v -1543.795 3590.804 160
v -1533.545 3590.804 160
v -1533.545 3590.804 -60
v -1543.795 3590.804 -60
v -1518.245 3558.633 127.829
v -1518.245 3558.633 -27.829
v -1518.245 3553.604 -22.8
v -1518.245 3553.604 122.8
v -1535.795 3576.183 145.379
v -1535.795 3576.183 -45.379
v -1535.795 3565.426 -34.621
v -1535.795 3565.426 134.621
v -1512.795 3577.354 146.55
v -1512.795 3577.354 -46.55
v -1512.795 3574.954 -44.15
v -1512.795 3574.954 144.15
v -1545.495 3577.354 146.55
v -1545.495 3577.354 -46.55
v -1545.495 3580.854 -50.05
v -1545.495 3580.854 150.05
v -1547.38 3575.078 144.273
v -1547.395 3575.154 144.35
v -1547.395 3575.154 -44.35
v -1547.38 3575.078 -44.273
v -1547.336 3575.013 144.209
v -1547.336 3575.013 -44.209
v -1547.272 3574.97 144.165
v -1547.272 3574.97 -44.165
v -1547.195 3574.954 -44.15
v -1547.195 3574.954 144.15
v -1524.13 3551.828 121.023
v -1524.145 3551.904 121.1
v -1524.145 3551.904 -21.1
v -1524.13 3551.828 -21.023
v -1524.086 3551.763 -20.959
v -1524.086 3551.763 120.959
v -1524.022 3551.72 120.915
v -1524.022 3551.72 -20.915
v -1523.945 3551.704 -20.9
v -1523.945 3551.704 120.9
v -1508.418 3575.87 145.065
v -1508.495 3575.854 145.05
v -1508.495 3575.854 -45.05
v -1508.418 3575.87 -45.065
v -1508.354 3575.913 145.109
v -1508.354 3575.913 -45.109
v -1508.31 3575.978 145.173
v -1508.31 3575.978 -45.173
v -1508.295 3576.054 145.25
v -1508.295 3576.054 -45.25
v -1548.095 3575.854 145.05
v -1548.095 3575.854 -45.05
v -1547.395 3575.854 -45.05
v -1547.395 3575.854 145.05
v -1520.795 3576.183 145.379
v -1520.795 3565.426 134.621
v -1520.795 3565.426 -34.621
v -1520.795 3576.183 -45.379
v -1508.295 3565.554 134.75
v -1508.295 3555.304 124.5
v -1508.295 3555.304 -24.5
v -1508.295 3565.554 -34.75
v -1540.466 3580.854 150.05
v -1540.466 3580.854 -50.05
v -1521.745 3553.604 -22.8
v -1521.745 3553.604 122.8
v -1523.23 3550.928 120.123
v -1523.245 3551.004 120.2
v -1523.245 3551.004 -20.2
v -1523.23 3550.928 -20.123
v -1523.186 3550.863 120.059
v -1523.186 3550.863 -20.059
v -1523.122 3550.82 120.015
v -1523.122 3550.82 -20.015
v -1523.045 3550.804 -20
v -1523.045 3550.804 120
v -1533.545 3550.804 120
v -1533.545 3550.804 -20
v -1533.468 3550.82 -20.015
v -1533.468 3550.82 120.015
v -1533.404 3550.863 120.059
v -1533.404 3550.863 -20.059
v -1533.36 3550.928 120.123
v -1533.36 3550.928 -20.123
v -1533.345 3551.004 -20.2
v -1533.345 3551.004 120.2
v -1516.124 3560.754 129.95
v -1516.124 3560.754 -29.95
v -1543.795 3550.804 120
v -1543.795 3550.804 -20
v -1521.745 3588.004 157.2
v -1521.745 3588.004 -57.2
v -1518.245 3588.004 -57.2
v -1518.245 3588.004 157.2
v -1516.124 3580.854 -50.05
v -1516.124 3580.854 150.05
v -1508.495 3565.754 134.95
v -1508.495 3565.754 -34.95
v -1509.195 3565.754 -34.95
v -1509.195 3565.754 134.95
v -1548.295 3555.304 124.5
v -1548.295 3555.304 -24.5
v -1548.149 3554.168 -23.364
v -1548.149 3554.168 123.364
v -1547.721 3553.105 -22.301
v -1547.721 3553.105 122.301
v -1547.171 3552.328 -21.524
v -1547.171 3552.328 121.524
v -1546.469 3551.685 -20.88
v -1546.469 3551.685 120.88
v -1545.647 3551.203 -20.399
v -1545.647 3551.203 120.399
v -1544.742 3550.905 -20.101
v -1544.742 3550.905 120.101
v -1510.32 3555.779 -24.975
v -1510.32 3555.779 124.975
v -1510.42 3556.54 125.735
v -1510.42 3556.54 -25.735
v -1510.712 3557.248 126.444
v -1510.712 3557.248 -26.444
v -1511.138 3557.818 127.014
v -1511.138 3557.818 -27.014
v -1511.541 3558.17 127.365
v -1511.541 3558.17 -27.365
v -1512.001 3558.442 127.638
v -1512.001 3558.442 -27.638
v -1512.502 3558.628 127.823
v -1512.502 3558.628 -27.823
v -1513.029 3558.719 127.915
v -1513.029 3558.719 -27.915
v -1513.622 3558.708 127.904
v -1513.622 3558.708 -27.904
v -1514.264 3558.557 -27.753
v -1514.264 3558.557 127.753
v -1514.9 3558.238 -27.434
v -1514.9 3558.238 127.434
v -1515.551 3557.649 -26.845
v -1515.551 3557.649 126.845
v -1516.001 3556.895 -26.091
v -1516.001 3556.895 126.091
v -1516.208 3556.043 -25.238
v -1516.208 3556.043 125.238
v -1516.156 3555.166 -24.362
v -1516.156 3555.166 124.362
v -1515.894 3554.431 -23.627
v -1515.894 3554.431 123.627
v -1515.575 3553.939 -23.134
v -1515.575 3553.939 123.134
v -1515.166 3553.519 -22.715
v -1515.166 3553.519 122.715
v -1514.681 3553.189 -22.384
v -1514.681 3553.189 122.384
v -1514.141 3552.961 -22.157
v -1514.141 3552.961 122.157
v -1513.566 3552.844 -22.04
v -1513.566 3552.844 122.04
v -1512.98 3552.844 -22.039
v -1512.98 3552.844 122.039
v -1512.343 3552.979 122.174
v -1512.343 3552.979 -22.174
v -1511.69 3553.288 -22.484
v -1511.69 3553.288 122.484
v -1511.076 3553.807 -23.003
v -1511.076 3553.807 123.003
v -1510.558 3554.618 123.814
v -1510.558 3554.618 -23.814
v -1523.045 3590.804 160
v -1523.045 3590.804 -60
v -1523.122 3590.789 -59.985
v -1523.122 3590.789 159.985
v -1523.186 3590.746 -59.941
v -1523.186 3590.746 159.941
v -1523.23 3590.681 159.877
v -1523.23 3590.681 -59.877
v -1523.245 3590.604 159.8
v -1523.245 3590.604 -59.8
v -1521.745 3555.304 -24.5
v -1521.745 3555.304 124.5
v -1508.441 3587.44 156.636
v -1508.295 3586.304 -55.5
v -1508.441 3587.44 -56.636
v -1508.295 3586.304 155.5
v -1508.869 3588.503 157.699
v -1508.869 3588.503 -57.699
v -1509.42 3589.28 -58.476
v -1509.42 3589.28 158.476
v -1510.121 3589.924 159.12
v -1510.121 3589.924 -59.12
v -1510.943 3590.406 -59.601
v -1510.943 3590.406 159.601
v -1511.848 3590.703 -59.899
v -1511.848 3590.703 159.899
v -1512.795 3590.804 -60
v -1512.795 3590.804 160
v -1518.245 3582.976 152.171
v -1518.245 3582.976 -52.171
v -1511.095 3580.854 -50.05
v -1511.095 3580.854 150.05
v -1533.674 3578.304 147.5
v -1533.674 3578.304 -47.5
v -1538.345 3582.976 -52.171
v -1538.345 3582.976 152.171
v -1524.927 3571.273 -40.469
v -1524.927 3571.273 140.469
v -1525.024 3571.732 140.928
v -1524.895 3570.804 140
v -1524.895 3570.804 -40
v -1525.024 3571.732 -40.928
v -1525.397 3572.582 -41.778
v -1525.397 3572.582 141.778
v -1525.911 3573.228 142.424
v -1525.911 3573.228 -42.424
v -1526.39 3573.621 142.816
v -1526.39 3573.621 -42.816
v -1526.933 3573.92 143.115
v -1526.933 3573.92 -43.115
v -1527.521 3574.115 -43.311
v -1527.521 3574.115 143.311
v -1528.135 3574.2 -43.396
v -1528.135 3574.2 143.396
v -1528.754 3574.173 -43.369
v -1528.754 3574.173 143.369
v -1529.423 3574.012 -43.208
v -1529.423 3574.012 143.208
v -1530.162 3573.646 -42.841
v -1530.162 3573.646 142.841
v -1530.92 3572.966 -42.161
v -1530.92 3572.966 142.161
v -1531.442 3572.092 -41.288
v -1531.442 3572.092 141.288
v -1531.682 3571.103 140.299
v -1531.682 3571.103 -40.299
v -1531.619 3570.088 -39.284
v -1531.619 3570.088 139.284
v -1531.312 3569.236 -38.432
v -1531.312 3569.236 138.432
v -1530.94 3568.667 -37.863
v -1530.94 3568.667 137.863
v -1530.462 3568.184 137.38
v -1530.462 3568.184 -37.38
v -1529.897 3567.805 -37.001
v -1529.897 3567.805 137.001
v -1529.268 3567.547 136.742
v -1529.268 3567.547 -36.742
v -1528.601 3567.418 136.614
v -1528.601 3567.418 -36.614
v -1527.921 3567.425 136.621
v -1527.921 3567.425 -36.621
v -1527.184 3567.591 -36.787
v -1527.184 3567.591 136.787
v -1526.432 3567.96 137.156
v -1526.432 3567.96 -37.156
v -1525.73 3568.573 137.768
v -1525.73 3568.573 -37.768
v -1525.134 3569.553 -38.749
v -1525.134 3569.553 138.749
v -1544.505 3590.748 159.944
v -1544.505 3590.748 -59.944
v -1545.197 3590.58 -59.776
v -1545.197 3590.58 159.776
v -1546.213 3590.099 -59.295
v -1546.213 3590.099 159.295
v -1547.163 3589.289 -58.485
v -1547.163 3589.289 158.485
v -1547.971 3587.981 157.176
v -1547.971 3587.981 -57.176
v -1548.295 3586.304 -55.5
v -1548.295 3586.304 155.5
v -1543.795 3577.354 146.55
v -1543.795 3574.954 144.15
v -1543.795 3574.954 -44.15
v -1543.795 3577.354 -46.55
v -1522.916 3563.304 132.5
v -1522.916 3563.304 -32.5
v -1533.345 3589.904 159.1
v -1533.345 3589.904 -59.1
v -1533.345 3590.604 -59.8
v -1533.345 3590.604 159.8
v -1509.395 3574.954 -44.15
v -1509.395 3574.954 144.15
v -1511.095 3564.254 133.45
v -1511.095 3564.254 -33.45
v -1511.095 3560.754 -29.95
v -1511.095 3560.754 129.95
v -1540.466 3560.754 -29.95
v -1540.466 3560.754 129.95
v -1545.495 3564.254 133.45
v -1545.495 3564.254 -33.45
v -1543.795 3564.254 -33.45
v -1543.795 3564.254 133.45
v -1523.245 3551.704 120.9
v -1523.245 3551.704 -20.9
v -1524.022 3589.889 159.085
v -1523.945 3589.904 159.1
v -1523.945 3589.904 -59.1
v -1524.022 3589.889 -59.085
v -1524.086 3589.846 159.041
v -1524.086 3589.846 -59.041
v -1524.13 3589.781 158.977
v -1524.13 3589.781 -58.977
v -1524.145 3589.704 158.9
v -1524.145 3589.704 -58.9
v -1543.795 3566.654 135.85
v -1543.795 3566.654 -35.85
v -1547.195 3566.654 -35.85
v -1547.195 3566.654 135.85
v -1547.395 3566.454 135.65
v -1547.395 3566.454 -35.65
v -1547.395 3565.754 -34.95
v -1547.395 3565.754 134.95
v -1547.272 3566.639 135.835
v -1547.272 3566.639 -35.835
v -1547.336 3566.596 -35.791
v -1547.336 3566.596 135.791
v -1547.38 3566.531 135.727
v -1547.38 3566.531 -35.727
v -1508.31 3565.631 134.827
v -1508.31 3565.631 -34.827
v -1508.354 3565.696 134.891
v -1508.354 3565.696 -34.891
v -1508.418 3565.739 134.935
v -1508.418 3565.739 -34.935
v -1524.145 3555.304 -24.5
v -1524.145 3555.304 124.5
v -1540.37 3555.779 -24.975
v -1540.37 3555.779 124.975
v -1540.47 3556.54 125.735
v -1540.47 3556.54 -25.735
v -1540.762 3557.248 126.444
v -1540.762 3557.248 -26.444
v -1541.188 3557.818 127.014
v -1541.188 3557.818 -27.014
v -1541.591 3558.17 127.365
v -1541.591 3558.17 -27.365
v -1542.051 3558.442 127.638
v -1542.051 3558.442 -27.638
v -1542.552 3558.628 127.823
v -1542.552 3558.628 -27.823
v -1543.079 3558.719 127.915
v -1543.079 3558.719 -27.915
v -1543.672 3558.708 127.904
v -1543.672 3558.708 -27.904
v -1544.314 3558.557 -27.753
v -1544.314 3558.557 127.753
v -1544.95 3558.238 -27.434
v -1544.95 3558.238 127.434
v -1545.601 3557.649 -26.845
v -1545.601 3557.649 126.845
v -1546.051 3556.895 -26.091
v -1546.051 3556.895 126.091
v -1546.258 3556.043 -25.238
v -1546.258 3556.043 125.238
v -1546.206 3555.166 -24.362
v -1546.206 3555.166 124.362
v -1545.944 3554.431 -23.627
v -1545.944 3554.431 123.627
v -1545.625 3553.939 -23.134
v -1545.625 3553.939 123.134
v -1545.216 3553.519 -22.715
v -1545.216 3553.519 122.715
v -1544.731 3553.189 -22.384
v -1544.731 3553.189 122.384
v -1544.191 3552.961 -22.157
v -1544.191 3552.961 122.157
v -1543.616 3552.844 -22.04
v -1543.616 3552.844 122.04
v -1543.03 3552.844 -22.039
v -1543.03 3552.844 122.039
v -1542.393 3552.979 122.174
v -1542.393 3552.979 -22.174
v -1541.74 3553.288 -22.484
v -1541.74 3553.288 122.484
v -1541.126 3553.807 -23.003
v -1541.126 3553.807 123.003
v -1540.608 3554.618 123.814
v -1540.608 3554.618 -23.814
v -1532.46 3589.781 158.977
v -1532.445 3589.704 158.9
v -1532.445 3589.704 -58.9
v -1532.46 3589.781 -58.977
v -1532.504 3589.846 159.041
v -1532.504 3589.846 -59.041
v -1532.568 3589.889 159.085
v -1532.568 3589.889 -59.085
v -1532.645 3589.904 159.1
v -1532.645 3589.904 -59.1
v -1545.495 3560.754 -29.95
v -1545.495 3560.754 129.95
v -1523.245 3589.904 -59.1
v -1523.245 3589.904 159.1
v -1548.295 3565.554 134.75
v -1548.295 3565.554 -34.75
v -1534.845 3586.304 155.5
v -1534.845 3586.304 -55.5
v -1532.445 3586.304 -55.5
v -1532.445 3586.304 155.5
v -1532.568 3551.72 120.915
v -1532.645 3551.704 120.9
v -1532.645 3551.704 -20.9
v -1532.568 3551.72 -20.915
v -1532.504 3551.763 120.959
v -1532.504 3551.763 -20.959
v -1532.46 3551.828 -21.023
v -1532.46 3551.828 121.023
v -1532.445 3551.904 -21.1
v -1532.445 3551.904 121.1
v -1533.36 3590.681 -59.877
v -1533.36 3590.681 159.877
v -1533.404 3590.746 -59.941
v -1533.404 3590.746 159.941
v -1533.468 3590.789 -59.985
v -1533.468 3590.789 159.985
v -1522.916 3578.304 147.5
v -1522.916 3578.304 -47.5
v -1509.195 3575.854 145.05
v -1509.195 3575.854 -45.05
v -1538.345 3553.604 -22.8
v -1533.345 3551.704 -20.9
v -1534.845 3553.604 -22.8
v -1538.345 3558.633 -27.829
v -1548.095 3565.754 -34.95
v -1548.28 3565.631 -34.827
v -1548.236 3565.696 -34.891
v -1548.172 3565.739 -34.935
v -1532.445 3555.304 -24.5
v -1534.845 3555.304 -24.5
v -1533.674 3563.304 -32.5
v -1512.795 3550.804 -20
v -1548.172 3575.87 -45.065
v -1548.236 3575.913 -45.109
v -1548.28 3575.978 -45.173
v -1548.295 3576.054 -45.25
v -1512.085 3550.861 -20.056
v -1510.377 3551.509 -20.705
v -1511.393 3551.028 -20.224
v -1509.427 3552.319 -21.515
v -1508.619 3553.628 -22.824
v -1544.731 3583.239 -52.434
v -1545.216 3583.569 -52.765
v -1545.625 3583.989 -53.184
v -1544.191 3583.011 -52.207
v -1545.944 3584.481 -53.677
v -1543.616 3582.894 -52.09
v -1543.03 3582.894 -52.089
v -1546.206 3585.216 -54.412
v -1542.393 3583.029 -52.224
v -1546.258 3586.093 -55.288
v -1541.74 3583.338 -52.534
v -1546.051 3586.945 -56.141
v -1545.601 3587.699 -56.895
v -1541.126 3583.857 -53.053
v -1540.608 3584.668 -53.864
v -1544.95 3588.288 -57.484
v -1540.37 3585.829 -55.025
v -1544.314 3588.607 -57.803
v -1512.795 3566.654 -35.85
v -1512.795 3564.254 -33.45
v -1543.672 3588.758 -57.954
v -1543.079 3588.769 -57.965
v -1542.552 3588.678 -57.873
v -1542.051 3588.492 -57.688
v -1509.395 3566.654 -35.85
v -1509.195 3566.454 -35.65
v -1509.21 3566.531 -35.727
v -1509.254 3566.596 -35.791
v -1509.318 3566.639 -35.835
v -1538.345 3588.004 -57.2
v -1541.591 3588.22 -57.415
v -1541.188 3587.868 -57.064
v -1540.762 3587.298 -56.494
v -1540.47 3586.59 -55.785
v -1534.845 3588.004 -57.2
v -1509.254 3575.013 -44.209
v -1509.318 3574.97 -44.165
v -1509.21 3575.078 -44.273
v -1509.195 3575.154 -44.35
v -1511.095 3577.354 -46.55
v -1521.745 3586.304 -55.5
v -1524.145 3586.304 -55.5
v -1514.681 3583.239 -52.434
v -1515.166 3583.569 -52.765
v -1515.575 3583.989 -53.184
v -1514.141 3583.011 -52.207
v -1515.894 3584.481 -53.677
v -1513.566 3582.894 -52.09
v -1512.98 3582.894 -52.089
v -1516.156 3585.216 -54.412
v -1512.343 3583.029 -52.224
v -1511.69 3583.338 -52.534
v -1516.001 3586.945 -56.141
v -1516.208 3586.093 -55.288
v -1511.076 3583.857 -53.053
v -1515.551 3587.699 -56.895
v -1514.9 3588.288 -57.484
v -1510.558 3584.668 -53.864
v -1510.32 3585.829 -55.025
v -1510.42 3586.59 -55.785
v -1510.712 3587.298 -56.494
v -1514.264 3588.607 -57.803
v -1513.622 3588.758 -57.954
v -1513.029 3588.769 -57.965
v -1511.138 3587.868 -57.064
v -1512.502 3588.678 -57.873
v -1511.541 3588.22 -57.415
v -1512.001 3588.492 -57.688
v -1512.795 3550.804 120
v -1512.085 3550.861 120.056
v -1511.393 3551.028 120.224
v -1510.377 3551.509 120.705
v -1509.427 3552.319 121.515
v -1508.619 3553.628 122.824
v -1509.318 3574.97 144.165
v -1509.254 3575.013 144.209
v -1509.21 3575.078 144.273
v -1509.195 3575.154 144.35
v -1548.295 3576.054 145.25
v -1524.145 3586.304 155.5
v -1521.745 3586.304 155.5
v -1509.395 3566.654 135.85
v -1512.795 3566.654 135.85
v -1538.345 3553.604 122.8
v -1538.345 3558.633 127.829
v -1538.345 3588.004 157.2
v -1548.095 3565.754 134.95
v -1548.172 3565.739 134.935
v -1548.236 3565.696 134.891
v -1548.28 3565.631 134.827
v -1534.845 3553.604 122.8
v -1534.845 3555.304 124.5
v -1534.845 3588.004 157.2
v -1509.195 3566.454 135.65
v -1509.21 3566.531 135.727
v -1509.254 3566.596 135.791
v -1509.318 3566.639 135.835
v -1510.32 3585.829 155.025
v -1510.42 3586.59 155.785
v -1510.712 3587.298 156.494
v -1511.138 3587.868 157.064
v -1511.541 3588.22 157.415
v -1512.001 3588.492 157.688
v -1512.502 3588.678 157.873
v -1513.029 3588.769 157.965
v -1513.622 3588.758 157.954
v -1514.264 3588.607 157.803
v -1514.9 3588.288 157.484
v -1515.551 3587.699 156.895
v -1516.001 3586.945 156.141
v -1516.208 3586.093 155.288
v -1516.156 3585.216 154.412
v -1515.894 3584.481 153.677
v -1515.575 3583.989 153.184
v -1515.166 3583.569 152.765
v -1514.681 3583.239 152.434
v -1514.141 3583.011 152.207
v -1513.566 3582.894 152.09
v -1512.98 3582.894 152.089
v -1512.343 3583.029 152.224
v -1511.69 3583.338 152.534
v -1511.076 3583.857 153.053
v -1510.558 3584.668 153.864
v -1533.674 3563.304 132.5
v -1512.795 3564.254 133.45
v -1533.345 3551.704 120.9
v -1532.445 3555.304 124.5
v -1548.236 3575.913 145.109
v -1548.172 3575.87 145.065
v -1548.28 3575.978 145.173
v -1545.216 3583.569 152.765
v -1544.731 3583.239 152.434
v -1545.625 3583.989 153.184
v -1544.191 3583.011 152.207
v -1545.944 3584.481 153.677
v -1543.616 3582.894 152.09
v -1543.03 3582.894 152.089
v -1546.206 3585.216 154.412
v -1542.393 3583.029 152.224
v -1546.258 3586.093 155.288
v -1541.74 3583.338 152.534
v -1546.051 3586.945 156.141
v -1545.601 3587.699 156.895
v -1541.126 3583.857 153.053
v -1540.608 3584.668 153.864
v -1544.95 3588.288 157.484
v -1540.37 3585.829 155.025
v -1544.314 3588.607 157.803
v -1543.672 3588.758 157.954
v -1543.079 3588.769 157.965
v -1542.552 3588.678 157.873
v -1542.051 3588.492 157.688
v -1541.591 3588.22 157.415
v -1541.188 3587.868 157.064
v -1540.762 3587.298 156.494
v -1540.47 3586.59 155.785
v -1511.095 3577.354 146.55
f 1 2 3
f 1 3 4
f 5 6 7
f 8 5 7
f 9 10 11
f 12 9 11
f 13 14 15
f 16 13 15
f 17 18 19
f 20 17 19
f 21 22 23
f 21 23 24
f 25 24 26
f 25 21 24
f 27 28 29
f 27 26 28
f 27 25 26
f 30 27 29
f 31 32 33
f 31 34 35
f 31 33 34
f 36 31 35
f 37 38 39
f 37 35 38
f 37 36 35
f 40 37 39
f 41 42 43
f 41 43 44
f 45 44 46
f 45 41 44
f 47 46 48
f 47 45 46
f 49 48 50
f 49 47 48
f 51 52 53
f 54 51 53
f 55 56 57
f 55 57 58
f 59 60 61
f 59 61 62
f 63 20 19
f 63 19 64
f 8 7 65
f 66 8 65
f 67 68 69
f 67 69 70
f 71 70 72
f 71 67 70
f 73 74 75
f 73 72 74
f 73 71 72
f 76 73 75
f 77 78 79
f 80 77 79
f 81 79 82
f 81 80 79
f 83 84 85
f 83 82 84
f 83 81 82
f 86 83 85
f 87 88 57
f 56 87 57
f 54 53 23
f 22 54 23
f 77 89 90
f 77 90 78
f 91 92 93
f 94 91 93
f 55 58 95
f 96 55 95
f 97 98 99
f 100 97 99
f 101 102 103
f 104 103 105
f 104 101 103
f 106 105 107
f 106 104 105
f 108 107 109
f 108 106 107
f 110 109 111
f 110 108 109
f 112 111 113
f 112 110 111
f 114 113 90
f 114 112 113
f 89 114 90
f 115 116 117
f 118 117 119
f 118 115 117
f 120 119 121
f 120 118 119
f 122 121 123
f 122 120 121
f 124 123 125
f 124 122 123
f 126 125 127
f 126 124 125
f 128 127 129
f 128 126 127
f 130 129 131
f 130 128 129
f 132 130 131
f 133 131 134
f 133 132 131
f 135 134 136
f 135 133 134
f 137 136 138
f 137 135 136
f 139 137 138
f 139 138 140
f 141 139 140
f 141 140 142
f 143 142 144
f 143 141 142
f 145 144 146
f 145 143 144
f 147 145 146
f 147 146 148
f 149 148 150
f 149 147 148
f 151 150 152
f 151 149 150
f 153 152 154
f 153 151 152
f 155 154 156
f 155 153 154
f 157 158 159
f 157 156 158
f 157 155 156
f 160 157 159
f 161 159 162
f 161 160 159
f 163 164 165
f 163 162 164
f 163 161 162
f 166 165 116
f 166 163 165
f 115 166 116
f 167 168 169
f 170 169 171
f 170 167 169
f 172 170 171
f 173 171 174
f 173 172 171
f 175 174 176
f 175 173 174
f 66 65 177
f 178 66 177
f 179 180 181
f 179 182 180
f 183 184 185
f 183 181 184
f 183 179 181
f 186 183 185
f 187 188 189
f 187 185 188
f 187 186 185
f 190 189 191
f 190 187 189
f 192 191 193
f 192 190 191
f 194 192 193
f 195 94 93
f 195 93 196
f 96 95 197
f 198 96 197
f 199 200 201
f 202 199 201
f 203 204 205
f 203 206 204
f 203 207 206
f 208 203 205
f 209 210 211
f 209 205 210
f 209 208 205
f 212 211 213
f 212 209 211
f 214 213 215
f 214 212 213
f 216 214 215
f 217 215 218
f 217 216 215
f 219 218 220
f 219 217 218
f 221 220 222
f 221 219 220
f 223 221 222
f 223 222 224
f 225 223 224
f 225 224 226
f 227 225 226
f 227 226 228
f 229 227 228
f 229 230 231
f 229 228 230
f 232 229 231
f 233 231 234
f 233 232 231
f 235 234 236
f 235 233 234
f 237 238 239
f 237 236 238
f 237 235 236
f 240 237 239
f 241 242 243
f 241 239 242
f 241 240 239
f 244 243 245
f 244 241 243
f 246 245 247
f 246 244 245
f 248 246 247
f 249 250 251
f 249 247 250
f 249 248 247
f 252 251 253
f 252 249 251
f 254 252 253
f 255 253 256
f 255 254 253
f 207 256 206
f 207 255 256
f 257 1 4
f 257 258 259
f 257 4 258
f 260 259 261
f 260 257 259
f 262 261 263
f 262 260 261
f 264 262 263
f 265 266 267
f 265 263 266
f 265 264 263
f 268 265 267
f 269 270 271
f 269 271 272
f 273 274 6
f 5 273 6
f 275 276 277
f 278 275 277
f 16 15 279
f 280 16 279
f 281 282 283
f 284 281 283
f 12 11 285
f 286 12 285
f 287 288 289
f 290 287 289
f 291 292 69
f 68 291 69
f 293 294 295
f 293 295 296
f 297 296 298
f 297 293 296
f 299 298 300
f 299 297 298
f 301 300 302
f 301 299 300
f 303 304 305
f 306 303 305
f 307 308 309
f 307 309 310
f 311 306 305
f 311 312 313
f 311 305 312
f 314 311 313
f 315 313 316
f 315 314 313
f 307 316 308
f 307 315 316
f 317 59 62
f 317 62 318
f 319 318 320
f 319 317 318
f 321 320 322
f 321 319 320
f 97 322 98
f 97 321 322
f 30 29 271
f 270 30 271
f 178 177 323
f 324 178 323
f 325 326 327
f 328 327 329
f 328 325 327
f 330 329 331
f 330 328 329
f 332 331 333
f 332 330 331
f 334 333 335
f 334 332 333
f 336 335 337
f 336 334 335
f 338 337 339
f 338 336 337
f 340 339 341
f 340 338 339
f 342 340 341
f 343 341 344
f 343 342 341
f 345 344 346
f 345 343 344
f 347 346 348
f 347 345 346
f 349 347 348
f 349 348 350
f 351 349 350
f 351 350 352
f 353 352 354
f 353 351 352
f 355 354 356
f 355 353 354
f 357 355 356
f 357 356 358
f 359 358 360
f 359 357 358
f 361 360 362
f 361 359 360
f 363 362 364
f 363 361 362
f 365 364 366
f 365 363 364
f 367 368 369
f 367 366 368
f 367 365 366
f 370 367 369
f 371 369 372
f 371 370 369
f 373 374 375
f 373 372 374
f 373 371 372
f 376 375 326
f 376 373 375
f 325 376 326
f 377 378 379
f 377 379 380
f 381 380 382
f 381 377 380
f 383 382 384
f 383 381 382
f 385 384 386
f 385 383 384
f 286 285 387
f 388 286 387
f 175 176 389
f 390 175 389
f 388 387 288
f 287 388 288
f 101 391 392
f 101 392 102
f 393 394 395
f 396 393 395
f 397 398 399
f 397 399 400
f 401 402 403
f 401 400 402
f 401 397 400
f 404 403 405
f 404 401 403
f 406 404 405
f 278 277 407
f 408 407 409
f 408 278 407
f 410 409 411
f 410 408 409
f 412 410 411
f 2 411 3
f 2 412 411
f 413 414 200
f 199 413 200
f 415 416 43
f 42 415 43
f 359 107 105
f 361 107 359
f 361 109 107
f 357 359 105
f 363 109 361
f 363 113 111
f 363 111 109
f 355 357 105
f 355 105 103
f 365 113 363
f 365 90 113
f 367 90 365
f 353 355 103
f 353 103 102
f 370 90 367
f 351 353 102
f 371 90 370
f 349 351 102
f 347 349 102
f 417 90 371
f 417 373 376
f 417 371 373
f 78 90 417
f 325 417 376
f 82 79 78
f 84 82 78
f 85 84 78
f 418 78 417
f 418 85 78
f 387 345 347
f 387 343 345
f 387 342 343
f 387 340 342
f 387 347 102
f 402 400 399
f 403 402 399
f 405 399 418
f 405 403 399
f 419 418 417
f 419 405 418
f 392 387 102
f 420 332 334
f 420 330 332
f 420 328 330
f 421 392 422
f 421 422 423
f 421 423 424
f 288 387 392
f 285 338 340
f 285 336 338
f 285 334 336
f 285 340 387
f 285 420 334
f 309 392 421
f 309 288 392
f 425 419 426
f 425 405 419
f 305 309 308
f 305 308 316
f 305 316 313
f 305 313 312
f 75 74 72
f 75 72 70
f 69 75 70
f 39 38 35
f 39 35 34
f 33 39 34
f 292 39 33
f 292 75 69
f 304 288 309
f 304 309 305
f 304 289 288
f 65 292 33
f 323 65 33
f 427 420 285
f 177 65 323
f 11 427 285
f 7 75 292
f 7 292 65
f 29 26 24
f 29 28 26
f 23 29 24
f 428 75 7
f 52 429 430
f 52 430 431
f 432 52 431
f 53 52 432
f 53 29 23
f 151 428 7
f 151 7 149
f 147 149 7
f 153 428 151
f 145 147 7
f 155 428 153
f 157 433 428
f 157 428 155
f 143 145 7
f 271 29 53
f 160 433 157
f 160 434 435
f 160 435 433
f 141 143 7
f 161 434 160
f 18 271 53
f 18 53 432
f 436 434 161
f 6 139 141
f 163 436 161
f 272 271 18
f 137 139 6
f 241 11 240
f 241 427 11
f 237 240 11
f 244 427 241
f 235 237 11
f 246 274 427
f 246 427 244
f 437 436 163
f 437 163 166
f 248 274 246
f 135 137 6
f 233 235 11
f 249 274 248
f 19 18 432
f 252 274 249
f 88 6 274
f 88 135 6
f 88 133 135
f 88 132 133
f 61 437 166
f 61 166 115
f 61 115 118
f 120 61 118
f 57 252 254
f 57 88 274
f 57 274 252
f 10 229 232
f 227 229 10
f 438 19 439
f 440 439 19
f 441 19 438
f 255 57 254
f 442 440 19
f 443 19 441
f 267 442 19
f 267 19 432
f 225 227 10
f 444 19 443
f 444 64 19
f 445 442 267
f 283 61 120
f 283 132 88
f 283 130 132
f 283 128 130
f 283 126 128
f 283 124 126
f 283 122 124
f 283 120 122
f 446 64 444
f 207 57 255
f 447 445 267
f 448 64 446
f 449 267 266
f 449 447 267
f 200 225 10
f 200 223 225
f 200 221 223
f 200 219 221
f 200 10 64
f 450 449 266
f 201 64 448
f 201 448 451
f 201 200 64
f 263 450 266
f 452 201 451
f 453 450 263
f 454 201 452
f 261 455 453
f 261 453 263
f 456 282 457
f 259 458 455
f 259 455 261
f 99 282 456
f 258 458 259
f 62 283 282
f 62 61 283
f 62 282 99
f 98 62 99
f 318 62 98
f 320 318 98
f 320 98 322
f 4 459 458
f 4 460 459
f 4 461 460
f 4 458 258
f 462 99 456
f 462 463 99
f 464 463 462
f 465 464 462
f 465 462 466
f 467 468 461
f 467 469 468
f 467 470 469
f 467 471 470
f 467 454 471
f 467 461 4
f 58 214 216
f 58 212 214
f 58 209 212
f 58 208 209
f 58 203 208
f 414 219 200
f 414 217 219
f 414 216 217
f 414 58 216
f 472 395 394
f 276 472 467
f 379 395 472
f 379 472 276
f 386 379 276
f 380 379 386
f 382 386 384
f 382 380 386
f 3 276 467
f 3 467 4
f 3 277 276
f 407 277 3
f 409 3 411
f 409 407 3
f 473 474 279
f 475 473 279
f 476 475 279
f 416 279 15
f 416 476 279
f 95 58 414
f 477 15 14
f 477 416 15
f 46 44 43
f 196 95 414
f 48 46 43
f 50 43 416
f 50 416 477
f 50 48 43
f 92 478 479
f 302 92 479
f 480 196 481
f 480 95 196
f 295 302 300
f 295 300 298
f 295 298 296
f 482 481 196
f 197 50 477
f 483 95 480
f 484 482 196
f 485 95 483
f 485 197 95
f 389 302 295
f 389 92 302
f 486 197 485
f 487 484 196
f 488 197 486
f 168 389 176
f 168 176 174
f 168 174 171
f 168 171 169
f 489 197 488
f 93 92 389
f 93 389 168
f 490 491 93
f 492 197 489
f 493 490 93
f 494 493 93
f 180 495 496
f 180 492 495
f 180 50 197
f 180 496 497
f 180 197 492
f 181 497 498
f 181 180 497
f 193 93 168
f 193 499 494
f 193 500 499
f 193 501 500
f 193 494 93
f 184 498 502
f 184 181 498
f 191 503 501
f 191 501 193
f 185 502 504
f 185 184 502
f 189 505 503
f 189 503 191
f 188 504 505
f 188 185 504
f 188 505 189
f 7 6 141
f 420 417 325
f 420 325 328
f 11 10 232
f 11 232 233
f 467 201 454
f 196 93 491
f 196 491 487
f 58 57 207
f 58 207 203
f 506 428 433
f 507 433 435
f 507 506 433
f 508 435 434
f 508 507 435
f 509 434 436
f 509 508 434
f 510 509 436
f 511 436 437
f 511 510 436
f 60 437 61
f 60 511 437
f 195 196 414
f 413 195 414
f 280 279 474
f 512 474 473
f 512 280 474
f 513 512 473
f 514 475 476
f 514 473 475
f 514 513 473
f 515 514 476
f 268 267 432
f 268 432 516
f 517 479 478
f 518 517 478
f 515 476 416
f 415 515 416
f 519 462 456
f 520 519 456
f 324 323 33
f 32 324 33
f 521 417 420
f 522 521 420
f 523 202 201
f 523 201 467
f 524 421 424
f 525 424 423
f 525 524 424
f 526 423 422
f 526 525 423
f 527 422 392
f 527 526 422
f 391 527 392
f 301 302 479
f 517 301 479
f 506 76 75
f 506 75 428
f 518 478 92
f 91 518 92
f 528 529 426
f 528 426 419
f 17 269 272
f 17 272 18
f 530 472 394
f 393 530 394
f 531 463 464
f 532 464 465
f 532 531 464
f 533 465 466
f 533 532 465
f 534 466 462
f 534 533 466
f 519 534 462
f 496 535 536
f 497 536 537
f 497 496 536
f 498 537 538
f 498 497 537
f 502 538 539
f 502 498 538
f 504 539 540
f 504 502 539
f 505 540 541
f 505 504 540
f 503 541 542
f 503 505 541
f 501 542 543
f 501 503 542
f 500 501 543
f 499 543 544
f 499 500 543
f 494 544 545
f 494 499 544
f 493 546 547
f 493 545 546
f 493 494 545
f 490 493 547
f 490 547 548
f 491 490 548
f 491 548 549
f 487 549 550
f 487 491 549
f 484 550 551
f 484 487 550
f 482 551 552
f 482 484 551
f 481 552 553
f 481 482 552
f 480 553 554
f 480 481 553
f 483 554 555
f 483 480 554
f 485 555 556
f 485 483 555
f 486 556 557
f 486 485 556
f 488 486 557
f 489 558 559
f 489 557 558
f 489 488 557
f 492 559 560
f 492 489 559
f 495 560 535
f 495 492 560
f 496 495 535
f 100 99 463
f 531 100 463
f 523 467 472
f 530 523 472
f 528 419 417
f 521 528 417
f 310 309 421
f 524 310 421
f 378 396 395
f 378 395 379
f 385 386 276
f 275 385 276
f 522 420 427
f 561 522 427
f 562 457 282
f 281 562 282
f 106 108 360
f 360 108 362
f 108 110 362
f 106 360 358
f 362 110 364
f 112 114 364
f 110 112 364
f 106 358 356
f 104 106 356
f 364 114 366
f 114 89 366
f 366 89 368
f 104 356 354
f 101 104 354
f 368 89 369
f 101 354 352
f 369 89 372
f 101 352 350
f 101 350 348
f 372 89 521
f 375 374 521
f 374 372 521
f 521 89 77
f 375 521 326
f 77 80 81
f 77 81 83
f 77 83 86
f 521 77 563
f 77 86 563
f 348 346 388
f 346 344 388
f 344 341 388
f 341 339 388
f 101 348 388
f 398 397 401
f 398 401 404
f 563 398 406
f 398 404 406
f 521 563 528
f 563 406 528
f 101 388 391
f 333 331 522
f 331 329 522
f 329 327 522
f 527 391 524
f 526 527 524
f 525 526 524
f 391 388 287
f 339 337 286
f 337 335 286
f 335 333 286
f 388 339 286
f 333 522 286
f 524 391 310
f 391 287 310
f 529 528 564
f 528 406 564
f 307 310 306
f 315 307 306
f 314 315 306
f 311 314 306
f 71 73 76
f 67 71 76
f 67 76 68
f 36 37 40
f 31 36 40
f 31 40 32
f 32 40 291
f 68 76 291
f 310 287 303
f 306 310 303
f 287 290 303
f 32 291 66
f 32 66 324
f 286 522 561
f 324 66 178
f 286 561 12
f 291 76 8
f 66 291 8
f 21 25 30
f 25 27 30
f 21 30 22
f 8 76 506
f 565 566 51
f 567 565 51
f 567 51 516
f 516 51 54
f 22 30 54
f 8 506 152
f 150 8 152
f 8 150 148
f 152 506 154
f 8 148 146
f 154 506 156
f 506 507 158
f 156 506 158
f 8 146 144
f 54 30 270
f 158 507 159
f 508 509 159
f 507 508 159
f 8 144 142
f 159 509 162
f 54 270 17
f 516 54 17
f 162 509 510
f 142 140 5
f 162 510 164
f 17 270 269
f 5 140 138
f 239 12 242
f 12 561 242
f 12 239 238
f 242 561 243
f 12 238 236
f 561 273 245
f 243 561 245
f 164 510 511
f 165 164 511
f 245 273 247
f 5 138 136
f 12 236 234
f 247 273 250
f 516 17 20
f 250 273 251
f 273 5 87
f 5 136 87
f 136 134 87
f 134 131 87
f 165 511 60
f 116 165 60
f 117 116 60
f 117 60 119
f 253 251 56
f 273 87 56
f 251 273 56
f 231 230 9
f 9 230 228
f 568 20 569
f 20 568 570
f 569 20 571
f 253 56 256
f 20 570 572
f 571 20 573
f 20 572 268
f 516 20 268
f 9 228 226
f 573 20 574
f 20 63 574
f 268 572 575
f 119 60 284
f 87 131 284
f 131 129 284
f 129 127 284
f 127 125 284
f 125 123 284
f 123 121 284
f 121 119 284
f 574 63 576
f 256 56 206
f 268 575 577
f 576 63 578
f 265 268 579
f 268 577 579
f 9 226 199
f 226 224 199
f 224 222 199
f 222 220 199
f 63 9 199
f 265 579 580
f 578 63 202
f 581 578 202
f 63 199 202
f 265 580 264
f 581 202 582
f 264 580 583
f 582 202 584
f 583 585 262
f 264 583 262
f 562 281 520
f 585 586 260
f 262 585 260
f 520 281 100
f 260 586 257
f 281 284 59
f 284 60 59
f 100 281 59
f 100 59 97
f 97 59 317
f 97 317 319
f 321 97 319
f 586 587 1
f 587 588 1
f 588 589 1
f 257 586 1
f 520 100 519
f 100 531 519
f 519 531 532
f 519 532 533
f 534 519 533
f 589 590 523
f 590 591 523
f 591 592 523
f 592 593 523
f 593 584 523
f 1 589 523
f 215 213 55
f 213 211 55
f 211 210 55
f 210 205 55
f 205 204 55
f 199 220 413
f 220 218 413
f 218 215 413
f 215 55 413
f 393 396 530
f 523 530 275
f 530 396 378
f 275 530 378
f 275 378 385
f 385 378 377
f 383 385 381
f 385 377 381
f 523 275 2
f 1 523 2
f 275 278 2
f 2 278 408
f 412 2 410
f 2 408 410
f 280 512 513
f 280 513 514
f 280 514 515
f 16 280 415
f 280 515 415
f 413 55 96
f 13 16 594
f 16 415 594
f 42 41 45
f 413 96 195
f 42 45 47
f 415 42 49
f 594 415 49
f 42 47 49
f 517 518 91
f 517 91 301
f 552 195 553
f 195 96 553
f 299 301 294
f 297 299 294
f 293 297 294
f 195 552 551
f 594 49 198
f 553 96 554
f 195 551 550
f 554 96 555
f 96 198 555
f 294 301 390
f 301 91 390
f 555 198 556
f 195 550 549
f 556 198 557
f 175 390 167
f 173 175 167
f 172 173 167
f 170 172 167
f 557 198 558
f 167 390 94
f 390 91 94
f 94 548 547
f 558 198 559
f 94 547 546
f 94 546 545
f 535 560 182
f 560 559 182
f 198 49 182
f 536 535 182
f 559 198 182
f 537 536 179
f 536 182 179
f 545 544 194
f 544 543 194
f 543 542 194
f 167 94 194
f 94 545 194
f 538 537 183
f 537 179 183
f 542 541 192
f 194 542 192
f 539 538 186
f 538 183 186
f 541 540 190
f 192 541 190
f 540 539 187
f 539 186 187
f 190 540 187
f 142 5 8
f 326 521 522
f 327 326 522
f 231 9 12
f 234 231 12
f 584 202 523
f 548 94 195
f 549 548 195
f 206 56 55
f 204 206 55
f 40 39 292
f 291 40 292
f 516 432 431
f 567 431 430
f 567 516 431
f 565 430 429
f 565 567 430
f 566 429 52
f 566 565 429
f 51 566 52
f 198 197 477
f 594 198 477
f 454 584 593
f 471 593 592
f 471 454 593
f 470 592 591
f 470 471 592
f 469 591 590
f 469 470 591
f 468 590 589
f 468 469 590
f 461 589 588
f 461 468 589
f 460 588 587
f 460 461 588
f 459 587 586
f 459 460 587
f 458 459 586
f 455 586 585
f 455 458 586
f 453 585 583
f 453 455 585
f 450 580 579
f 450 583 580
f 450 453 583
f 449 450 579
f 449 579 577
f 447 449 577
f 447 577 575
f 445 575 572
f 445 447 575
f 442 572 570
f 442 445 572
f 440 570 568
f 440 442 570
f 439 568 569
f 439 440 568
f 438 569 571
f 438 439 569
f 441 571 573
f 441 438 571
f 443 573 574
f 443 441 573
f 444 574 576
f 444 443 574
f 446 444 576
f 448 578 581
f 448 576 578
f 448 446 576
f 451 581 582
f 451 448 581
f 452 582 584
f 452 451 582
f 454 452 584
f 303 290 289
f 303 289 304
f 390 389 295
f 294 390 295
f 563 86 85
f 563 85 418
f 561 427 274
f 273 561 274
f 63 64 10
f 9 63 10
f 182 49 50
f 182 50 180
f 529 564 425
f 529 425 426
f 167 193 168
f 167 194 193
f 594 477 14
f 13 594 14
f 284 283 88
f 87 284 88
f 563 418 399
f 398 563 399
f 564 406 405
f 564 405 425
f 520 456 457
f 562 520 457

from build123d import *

# Parameters (mm, degrees)
SKETCH_1_R          = 2.95
SKETCH_1_R_2        = 3.4
EXTRUDE_1_DEPTH     = 110
CUT_EXTRUDE_1_DEPTH = 86


with BuildPart() as part:
    # 草图1 → 凸台-拉伸1 (new body, symmetric)
    with BuildSketch(Plane.XY.offset(50)):
        with BuildLine():
            Line((-1518.245004392, 3588.004280474), (-1518.245004392, 3582.975600817))
            Line((-1518.245004392, 3582.975600817), (-1522.916324736, 3578.304280474))
            Line((-1522.916324736, 3578.304280474), (-1533.673684048, 3578.304280474))
            Line((-1533.673684048, 3578.304280474), (-1538.345004392, 3582.975600817))
            Line((-1538.345004392, 3582.975600817), (-1538.345004392, 3588.004280474))
            Line((-1538.345004392, 3588.004280474), (-1534.845004392, 3588.004280474))
            Line((-1534.845004392, 3588.004280474), (-1534.845004392, 3586.304280474))
            Line((-1534.845004392, 3586.304280474), (-1532.445004392, 3586.304280474))
            Line((-1532.445004392, 3586.304280474), (-1532.445004392, 3589.704280474))
            ThreePointArc((-1532.445004392, 3589.704280474), (-1532.503583036, 3589.84570183), (-1532.645004392, 3589.904280474))
            Line((-1532.645004392, 3589.904280474), (-1533.345004392, 3589.904280474))
            Line((-1533.345004392, 3589.904280474), (-1533.345004392, 3590.604280474))
            ThreePointArc((-1533.345004392, 3590.604280474), (-1533.403583036, 3590.74570183), (-1533.545004392, 3590.804280474))
            Line((-1533.545004392, 3590.804280474), (-1543.795004392, 3590.804280474))
            ThreePointArc((-1543.795004392, 3590.804280474), (-1546.976984907, 3589.486260989), (-1548.295004392, 3586.304280474))
            Line((-1548.295004392, 3586.304280474), (-1548.295004392, 3576.054280474))
            ThreePointArc((-1548.295004392, 3576.054280474), (-1548.236425748, 3575.912859117), (-1548.095004392, 3575.854280474))
            Line((-1548.095004392, 3575.854280474), (-1547.395004392, 3575.854280474))
            Line((-1547.395004392, 3575.854280474), (-1547.395004392, 3575.154280474))
            ThreePointArc((-1547.395004392, 3575.154280474), (-1547.336425748, 3575.012859117), (-1547.195004392, 3574.954280474))
            Line((-1547.195004392, 3574.954280474), (-1543.795004392, 3574.954280474))
            Line((-1543.795004392, 3574.954280474), (-1543.795004392, 3577.354280474))
            Line((-1543.795004392, 3577.354280474), (-1545.495004392, 3577.354280474))
            Line((-1545.495004392, 3577.354280474), (-1545.495004392, 3580.854280474))
            Line((-1545.495004392, 3580.854280474), (-1540.466324736, 3580.854280474))
            Line((-1540.466324736, 3580.854280474), (-1535.795004392, 3576.18296013))
            Line((-1535.795004392, 3576.18296013), (-1535.795004392, 3565.425600817))
            Line((-1535.795004392, 3565.425600817), (-1540.466324736, 3560.754280474))
            Line((-1540.466324736, 3560.754280474), (-1545.495004392, 3560.754280474))
            Line((-1545.495004392, 3560.754280474), (-1545.495004392, 3564.254280474))
            Line((-1545.495004392, 3564.254280474), (-1543.795004392, 3564.254280474))
            Line((-1543.795004392, 3564.254280474), (-1543.795004392, 3566.654280474))
            Line((-1543.795004392, 3566.654280474), (-1547.195004392, 3566.654280474))
            ThreePointArc((-1547.195004392, 3566.654280474), (-1547.336425748, 3566.59570183), (-1547.395004392, 3566.454280474))
            Line((-1547.395004392, 3566.454280474), (-1547.395004392, 3565.754280474))
            Line((-1547.395004392, 3565.754280474), (-1548.095004392, 3565.754280474))
            ThreePointArc((-1548.095004392, 3565.754280474), (-1548.236425748, 3565.69570183), (-1548.295004392, 3565.554280474))
            Line((-1548.295004392, 3565.554280474), (-1548.295004392, 3555.304280474))
            ThreePointArc((-1548.295004392, 3555.304280474), (-1546.976984907, 3552.122299958), (-1543.795004392, 3550.804280474))
            Line((-1543.795004392, 3550.804280474), (-1533.545004392, 3550.804280474))
            ThreePointArc((-1533.545004392, 3550.804280474), (-1533.403583036, 3550.862859117), (-1533.345004392, 3551.004280474))
            Line((-1533.345004392, 3551.004280474), (-1533.345004392, 3551.704280474))
            Line((-1533.345004392, 3551.704280474), (-1532.645004392, 3551.704280474))
            ThreePointArc((-1532.645004392, 3551.704280474), (-1532.503583036, 3551.762859117), (-1532.445004392, 3551.904280474))
            Line((-1532.445004392, 3551.904280474), (-1532.445004392, 3555.304280474))
            Line((-1532.445004392, 3555.304280474), (-1534.845004392, 3555.304280474))
            Line((-1534.845004392, 3555.304280474), (-1534.845004392, 3553.604280474))
            Line((-1534.845004392, 3553.604280474), (-1538.345004392, 3553.604280474))
            Line((-1538.345004392, 3553.604280474), (-1538.345004392, 3558.63296013))
            Line((-1538.345004392, 3558.63296013), (-1533.673684048, 3563.304280474))
            Line((-1533.673684048, 3563.304280474), (-1522.916324736, 3563.304280474))
            Line((-1522.916324736, 3563.304280474), (-1518.245004392, 3558.63296013))
            Line((-1518.245004392, 3558.63296013), (-1518.245004392, 3553.604280474))
            Line((-1518.245004392, 3553.604280474), (-1521.745004392, 3553.604280474))
            Line((-1521.745004392, 3553.604280474), (-1521.745004392, 3555.304280474))
            Line((-1521.745004392, 3555.304280474), (-1524.145004392, 3555.304280474))
            Line((-1524.145004392, 3555.304280474), (-1524.145004392, 3551.904280474))
            ThreePointArc((-1524.145004392, 3551.904280474), (-1524.086425748, 3551.762859117), (-1523.945004392, 3551.704280474))
            Line((-1523.945004392, 3551.704280474), (-1523.245004392, 3551.704280474))
            Line((-1523.245004392, 3551.704280474), (-1523.245004392, 3551.004280474))
            ThreePointArc((-1523.245004392, 3551.004280474), (-1523.186425748, 3550.862859117), (-1523.045004392, 3550.804280474))
            Line((-1523.045004392, 3550.804280474), (-1512.795004392, 3550.804280474))
            ThreePointArc((-1512.795004392, 3550.804280474), (-1509.613023877, 3552.122299958), (-1508.295004392, 3555.304280474))
            Line((-1508.295004392, 3555.304280474), (-1508.295004392, 3565.554280474))
            ThreePointArc((-1508.295004392, 3565.554280474), (-1508.353583036, 3565.69570183), (-1508.495004392, 3565.754280474))
            Line((-1508.495004392, 3565.754280474), (-1509.195004392, 3565.754280474))
            Line((-1509.195004392, 3565.754280474), (-1509.195004392, 3566.454280474))
            ThreePointArc((-1509.195004392, 3566.454280474), (-1509.253583036, 3566.59570183), (-1509.395004392, 3566.654280474))
            Line((-1509.395004392, 3566.654280474), (-1512.795004392, 3566.654280474))
            Line((-1512.795004392, 3566.654280474), (-1512.795004392, 3564.254280474))
            Line((-1512.795004392, 3564.254280474), (-1511.095004392, 3564.254280474))
            Line((-1511.095004392, 3564.254280474), (-1511.095004392, 3560.754280474))
            Line((-1511.095004392, 3560.754280474), (-1516.123684048, 3560.754280474))
            Line((-1516.123684048, 3560.754280474), (-1520.795004392, 3565.425600817))
            Line((-1520.795004392, 3565.425600817), (-1520.795004392, 3576.18296013))
            Line((-1520.795004392, 3576.18296013), (-1516.123684048, 3580.854280474))
            Line((-1516.123684048, 3580.854280474), (-1511.095004392, 3580.854280474))
            Line((-1511.095004392, 3580.854280474), (-1511.095004392, 3577.354280474))
            Line((-1511.095004392, 3577.354280474), (-1512.795004392, 3577.354280474))
            Line((-1512.795004392, 3577.354280474), (-1512.795004392, 3574.954280474))
            Line((-1512.795004392, 3574.954280474), (-1509.395004392, 3574.954280474))
            ThreePointArc((-1509.395004392, 3574.954280474), (-1509.253583036, 3575.012859117), (-1509.195004392, 3575.154280474))
            Line((-1509.195004392, 3575.154280474), (-1509.195004392, 3575.854280474))
            Line((-1509.195004392, 3575.854280474), (-1508.495004392, 3575.854280474))
            ThreePointArc((-1508.495004392, 3575.854280474), (-1508.353583036, 3575.912859117), (-1508.295004392, 3576.054280474))
            Line((-1508.295004392, 3576.054280474), (-1508.295004392, 3586.304280474))
            ThreePointArc((-1508.295004392, 3586.304280474), (-1509.613023877, 3589.486260989), (-1512.795004392, 3590.804280474))
            Line((-1512.795004392, 3590.804280474), (-1523.045004392, 3590.804280474))
            ThreePointArc((-1523.045004392, 3590.804280474), (-1523.186425748, 3590.74570183), (-1523.245004392, 3590.604280474))
            Line((-1523.245004392, 3590.604280474), (-1523.245004392, 3589.904280474))
            Line((-1523.245004392, 3589.904280474), (-1523.945004392, 3589.904280474))
            ThreePointArc((-1523.945004392, 3589.904280474), (-1524.086425748, 3589.84570183), (-1524.145004392, 3589.704280474))
            Line((-1524.145004392, 3589.704280474), (-1524.145004392, 3586.304280474))
            Line((-1524.145004392, 3586.304280474), (-1521.745004392, 3586.304280474))
            Line((-1521.745004392, 3586.304280474), (-1521.745004392, 3588.004280474))
            Line((-1521.745004392, 3588.004280474), (-1518.245004392, 3588.004280474))
        make_face()
        with Locations((-1513.270004392, 3555.779280474)):
            Circle(SKETCH_1_R, mode=Mode.SUBTRACT)
        with Locations((-1528.295004392, 3570.804280474)):
            Circle(SKETCH_1_R_2, mode=Mode.SUBTRACT)
        with Locations((-1513.270004392, 3585.829280474)):
            Circle(SKETCH_1_R, mode=Mode.SUBTRACT)
        with Locations((-1543.320004392, 3585.829280474)):
            Circle(SKETCH_1_R, mode=Mode.SUBTRACT)
        with Locations((-1543.320004392, 3555.779280474)):
            Circle(SKETCH_1_R, mode=Mode.SUBTRACT)
    extrude(amount=EXTRUDE_1_DEPTH, both=True)

    # 草图2 → 切除-拉伸1 (cut)
    with BuildSketch(Plane(origin=(-1508.295004392, 0, 0), x_dir=(0, 0, -1), z_dir=(1, 0, 0))):
        Polygon((60, 3590.804280474), (60, 3550.804280474), (20, 3550.804280474), align=None)
        Polygon((-160, 3590.804280474), (-160, 3550.804280474), (-120, 3550.804280474), align=None)
    extrude(amount=-CUT_EXTRUDE_1_DEPTH, mode=Mode.SUBTRACT)


solid = part.part
